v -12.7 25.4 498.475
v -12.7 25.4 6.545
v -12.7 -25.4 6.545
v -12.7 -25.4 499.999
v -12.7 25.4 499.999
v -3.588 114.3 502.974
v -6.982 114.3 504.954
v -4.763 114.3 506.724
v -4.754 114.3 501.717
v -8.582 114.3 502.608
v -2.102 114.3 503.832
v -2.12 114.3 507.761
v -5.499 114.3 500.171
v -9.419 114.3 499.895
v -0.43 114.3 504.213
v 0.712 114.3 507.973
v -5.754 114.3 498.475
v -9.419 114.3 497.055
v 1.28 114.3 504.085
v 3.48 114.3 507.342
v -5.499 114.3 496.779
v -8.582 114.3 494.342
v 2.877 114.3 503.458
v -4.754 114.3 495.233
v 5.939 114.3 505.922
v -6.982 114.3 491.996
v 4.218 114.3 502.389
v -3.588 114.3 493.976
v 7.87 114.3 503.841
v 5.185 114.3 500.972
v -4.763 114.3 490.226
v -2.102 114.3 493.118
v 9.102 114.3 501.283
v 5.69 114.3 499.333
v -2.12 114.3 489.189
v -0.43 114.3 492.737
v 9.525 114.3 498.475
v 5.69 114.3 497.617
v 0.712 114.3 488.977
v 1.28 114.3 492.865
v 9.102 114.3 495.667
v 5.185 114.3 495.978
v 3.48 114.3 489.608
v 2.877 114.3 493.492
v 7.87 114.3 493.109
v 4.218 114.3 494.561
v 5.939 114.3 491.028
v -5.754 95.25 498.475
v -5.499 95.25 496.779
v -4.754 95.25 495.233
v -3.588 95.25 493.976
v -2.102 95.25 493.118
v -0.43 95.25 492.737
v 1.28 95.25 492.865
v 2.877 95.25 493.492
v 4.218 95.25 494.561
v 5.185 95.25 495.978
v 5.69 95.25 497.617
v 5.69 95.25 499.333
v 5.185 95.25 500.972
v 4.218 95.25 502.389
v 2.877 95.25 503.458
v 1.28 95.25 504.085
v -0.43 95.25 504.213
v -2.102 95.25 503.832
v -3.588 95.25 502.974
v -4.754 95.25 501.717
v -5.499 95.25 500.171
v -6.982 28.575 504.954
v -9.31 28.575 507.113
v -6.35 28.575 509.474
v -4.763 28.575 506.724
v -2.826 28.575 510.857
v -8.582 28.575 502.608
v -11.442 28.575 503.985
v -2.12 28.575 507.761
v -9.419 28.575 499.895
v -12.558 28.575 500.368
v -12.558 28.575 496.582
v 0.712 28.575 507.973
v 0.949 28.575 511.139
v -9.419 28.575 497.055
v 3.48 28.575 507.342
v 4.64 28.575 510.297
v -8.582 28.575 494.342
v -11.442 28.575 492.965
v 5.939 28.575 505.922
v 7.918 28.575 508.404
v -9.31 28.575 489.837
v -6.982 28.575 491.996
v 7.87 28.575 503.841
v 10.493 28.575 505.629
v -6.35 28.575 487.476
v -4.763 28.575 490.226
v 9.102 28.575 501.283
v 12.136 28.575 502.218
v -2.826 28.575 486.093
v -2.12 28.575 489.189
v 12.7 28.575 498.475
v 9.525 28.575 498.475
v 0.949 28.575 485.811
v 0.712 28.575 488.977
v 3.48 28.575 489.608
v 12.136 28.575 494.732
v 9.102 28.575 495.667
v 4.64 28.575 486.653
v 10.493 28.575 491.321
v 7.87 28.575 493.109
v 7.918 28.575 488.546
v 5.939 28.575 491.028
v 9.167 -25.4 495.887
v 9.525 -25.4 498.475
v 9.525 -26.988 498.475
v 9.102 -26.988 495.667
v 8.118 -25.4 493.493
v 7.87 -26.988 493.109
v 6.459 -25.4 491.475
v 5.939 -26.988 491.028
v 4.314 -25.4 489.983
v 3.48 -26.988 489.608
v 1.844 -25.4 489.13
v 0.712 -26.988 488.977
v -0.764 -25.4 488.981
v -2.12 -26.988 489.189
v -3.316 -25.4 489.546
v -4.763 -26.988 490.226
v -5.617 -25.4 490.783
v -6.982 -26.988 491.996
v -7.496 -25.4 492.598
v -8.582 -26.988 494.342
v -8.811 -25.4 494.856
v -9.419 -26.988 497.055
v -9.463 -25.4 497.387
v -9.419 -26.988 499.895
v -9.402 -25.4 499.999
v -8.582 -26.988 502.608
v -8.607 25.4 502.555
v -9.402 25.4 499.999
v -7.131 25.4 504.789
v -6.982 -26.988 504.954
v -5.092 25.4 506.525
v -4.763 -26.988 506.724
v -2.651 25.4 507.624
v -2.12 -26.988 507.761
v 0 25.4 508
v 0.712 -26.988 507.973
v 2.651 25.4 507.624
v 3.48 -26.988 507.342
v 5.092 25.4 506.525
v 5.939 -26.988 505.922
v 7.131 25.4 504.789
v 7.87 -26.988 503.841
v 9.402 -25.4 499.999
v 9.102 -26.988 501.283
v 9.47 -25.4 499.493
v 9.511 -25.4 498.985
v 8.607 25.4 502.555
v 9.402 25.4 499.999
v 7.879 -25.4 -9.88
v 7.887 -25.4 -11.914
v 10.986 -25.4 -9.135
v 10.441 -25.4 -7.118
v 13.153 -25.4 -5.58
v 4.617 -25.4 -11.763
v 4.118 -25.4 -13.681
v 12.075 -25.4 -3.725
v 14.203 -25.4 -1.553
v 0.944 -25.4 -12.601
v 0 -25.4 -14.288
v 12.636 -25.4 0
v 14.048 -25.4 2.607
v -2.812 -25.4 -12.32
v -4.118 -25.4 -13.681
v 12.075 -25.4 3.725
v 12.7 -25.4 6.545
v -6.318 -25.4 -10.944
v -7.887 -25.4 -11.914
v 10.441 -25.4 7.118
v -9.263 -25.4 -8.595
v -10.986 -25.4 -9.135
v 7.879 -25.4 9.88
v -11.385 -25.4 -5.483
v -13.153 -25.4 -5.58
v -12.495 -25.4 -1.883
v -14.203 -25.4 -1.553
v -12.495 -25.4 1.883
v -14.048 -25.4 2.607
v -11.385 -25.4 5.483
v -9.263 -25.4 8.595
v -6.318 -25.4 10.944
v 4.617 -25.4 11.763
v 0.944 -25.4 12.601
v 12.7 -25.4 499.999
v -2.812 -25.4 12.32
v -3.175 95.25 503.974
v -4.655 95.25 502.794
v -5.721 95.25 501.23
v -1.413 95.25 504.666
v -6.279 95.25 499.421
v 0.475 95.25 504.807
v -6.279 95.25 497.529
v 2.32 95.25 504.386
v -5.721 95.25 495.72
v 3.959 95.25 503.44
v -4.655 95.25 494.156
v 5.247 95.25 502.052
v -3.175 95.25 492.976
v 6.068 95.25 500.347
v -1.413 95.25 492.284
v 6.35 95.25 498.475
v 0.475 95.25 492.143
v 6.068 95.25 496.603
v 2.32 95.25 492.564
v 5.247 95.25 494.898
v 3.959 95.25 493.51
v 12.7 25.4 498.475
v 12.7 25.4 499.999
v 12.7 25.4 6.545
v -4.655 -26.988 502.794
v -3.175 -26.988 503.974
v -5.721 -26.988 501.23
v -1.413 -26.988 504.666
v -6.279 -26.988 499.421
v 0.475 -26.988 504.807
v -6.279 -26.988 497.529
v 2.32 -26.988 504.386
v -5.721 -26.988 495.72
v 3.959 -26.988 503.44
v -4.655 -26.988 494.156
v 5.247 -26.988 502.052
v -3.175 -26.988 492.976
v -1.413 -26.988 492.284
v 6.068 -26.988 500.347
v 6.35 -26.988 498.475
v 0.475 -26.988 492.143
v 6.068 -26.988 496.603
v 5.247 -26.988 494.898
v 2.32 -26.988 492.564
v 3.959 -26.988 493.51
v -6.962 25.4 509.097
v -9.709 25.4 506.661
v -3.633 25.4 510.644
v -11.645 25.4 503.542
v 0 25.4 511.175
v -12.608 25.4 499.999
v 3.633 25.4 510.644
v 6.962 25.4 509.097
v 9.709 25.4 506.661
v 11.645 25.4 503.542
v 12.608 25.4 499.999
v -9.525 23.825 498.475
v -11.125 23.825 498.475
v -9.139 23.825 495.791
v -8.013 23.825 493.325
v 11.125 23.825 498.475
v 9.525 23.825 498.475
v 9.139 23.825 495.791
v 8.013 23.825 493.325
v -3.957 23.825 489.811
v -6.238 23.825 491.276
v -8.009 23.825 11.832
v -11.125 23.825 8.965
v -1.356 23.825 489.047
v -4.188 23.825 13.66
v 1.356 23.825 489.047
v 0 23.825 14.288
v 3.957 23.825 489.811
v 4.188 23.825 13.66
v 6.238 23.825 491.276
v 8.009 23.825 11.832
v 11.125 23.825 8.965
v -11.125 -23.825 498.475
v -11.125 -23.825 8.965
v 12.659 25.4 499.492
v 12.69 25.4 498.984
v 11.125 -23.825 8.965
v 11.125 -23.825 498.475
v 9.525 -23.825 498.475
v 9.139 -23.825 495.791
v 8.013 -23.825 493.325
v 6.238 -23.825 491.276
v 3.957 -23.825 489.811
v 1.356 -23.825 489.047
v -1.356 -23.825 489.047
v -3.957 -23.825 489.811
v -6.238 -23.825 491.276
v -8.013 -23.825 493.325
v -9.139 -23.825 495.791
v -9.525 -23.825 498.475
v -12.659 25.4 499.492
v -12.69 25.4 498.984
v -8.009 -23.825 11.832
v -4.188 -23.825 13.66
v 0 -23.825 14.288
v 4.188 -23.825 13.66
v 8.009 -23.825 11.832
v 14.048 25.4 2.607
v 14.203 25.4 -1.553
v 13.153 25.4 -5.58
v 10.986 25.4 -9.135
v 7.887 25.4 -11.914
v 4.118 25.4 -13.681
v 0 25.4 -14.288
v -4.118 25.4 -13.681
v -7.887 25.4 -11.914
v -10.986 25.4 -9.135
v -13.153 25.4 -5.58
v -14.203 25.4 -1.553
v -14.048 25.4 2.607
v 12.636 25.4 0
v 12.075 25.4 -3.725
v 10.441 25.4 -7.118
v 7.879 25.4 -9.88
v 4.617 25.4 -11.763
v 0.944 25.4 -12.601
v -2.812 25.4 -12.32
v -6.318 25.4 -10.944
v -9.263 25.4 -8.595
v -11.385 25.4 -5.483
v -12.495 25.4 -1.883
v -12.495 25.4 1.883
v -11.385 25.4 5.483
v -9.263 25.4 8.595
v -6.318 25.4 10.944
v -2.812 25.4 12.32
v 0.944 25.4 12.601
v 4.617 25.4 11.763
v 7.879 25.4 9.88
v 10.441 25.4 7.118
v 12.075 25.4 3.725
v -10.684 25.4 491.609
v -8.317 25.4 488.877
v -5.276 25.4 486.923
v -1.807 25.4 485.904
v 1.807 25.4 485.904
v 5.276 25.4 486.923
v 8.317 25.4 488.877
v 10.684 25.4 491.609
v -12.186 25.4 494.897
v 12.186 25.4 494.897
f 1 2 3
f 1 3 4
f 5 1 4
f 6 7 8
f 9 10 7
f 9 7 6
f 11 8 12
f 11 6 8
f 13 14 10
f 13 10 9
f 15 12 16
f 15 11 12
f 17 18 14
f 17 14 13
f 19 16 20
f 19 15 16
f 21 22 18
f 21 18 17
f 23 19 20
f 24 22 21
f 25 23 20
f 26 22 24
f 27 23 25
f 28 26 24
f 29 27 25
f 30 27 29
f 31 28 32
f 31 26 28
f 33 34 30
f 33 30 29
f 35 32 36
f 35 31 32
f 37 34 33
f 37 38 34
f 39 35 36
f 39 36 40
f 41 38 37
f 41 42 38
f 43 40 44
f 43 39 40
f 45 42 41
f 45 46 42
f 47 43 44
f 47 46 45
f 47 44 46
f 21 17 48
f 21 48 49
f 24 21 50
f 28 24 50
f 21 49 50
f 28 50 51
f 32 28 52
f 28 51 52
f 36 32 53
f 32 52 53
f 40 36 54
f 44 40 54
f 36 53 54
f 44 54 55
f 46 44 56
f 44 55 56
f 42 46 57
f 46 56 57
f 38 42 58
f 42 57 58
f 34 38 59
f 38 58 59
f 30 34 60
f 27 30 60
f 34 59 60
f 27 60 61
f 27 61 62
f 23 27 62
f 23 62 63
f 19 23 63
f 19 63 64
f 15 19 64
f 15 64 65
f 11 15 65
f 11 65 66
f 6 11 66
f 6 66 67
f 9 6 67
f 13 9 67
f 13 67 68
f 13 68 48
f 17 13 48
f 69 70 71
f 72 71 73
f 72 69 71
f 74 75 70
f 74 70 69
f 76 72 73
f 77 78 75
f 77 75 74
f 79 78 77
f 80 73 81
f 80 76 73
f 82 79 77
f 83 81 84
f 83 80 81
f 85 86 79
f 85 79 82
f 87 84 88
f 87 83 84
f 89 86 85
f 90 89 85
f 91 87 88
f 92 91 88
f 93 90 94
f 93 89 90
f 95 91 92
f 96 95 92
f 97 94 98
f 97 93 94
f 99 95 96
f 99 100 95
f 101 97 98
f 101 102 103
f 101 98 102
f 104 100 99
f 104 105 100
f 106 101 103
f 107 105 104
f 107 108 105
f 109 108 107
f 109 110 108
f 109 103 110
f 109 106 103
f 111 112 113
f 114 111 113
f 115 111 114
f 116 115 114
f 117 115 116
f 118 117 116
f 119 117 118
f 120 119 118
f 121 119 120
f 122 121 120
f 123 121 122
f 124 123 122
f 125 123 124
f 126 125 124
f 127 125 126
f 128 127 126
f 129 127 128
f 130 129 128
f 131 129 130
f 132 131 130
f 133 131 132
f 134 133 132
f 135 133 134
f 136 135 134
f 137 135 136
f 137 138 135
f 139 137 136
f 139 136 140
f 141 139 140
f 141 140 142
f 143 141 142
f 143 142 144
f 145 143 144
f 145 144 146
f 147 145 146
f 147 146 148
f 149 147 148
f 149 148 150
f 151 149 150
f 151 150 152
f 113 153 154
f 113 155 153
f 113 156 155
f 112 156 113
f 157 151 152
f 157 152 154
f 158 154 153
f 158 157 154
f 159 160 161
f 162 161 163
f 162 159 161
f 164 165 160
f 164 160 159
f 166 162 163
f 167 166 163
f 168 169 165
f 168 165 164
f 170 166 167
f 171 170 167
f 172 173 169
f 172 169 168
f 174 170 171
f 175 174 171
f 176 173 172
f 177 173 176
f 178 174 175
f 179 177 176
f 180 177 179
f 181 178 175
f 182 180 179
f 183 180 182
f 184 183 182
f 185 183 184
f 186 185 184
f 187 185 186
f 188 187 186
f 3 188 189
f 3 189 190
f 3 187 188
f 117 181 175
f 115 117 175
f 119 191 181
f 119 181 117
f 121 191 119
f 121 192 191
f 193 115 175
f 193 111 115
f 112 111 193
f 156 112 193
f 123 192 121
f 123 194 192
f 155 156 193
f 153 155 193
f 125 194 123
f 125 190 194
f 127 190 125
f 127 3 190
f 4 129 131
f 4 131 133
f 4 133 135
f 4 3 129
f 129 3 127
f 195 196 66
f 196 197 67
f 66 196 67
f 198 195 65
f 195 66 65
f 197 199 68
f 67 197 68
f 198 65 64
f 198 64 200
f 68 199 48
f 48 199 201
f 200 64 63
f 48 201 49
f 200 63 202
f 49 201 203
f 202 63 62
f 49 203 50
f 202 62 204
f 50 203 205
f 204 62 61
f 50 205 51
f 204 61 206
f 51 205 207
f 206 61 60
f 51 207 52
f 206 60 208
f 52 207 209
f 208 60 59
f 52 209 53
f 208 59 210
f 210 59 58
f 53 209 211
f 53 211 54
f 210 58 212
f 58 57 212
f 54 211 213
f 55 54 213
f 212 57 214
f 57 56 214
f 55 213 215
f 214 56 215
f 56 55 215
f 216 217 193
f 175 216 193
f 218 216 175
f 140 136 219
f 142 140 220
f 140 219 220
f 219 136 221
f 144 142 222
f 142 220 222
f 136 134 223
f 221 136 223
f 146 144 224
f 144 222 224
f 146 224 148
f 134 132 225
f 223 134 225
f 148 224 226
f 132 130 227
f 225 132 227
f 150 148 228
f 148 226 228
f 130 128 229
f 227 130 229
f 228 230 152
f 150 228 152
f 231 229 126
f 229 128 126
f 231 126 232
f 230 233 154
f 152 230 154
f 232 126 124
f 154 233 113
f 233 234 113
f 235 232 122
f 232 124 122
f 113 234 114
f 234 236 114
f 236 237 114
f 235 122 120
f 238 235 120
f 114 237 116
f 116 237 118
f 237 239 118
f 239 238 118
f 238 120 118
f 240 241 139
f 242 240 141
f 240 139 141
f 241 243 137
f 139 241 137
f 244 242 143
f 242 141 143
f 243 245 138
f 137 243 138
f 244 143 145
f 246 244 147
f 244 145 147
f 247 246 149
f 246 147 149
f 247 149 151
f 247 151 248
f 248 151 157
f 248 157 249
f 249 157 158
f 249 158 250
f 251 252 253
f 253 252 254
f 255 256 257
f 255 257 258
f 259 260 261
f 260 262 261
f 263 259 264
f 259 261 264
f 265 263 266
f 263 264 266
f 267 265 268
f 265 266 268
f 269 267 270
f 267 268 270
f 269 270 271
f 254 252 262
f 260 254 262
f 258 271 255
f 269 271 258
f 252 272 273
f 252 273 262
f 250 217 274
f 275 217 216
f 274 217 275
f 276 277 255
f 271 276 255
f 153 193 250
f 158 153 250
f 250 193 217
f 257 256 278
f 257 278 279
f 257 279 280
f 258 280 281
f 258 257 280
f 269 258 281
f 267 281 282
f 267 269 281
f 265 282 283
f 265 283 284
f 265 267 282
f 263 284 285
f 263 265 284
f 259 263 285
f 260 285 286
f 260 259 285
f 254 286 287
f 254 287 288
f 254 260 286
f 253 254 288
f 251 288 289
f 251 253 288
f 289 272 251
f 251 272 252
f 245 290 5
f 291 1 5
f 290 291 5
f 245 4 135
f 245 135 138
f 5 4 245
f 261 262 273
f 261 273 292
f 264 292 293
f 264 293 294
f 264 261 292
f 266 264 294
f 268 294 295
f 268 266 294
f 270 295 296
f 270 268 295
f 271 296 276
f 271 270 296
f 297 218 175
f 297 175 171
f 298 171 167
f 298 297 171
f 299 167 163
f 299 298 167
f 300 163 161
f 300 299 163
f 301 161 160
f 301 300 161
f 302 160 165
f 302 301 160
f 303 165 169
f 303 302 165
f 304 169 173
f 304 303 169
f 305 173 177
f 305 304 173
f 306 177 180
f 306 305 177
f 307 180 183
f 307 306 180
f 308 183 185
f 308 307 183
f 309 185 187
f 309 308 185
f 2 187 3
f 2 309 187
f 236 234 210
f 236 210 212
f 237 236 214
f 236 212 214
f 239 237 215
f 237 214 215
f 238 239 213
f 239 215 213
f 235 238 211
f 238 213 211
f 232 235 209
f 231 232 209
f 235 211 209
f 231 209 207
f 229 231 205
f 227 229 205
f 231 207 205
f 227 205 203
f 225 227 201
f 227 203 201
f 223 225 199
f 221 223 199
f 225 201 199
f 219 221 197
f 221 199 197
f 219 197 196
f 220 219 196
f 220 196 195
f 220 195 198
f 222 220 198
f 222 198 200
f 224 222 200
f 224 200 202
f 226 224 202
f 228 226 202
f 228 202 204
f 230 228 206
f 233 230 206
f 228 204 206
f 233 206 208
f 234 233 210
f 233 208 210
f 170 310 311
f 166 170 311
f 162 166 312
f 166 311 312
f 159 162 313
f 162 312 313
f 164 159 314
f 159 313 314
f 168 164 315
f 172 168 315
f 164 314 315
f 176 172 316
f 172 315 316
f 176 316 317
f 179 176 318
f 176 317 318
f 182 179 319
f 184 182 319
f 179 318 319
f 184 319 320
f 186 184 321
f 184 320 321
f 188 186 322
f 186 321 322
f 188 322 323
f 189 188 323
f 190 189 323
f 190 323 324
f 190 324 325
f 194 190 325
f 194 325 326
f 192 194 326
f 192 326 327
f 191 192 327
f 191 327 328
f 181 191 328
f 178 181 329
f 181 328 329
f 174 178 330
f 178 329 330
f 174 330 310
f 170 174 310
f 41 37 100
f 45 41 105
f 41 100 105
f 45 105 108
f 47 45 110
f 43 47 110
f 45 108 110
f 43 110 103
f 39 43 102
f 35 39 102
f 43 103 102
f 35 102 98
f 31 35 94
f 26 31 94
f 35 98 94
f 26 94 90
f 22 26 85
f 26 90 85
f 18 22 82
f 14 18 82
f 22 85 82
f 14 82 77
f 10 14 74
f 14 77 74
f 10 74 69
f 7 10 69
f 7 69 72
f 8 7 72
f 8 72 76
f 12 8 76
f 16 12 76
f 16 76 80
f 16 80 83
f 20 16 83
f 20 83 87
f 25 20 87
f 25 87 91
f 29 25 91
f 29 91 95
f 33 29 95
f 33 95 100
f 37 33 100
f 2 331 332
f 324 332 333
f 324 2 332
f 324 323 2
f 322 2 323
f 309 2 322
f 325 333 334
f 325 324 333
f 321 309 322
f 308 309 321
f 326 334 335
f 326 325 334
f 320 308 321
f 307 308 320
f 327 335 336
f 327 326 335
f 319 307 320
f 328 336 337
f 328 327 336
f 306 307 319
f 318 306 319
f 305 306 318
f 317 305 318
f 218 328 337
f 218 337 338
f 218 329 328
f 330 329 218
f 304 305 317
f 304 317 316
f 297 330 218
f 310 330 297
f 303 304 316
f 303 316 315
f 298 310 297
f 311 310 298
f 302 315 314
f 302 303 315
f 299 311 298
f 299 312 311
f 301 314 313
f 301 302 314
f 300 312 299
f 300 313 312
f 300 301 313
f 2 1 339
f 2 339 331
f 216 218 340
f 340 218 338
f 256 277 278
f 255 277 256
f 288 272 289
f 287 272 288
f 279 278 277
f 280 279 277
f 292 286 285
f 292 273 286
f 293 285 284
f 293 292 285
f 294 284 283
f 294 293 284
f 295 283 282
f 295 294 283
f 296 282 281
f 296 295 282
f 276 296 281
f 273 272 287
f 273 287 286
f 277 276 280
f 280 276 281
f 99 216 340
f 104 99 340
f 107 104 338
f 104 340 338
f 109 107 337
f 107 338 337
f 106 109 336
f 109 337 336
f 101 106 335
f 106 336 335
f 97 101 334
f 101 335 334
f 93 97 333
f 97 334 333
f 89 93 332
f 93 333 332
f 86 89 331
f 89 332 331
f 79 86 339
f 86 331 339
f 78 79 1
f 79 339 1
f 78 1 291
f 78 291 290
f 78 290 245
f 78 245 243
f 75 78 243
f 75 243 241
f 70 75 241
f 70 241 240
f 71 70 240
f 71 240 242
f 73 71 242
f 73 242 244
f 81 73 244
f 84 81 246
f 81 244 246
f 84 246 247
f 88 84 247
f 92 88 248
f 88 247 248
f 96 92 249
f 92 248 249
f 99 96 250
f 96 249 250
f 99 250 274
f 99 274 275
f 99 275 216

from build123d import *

# Parameters (mm, degrees)
SKETCH1_W                       = 25.4
SKETCH1_H                       = 50.8
SKETCH1_W_2                     = 22.2504
SKETCH1_H_2                     = 47.6504
BOSS_EXTRUDE1_DEPTH             = 498.475
SKETCH2_R                       = 14.2875
SKETCH2_R_2                     = 9.525
CUT_EXTRUDE1_DEPTH              = 51.8
SKETCH3_R                       = 14.2875
SKETCH3_R_2                     = 12.6365
BOSS_EXTRUDE2_DEPTH             = 50.8
SKETCH4_R                       = 9.525
SKETCH4_R_2                     = 6.35
BOSS_EXTRUDE3_DEPTH             = 88.9
BOSS_EXTRUDE3_DEPTH_BACK        = 52.3875
SKETCH5_R                       = 12.7
SKETCH5_R_2                     = 9.525
BOSS_EXTRUDE4_DEPTH             = 3.175
SKETCH6_R                       = 6.35
BOSS_EXTRUDE5_DEPTH             = 19.05
TAP_DRILL_FOR_1_2_20_TAP1_D     = 11.50874
TAP_DRILL_FOR_1_2_20_TAP1_DEPTH = 19.05
BOSS_EXTRUDE6_REACH             = 28.987
SKETCH9_W                       = 1.524
SKETCH9_H                       = 50.8
BOSS_EXTRUDE7_REACH             = 28.988
SKETCH10_W                      = 1.524
SKETCH10_H                      = 50.8


with BuildPart() as part:
    # Sketch1 → Boss-Extrude1 (new body)
    with BuildSketch(Plane.XY):
        Rectangle(SKETCH1_W, SKETCH1_H)
        Rectangle(SKETCH1_W_2, SKETCH1_H_2, mode=Mode.SUBTRACT)
    extrude(amount=BOSS_EXTRUDE1_DEPTH)

    # Sketch2 → Cut-Extrude1 (cut, through all)
    with BuildSketch(Plane(origin=(0, 25.4, 0), x_dir=(1, 0, 0), z_dir=(0, 1, 0))):
        Circle(SKETCH2_R)
        with Locations((0, -498.475)):
            Circle(SKETCH2_R_2)
    extrude(amount=-CUT_EXTRUDE1_DEPTH, mode=Mode.SUBTRACT)

    # Sketch3 → Boss-Extrude2 (add)
    with BuildSketch(Plane(origin=(0, 25.4, 0), x_dir=(1, 0, 0), z_dir=(0, 1, 0))):
        Circle(SKETCH3_R)
        Circle(SKETCH3_R_2, mode=Mode.SUBTRACT)
    extrude(amount=-BOSS_EXTRUDE2_DEPTH)

    # Sketch4 → Boss-Extrude3 (add, two sides)
    with BuildSketch(Plane(origin=(0, 25.4, 0), x_dir=(1, 0, 0), z_dir=(0, 1, 0))) as boss_extrude3_sk:
        with Locations((0, -498.475)):
            Circle(SKETCH4_R)
        with Locations((0, -498.475)):
            Circle(SKETCH4_R_2, mode=Mode.SUBTRACT)
    extrude(amount=BOSS_EXTRUDE3_DEPTH)
    extrude(boss_extrude3_sk.sketch, amount=-BOSS_EXTRUDE3_DEPTH_BACK)

    # Sketch5 → Boss-Extrude4 (add)
    with BuildSketch(Plane(origin=(0, 25.4, 0), x_dir=(1, 0, 0), z_dir=(0, 1, 0))):
        with Locations((0, -498.475)):
            Circle(SKETCH5_R)
        with Locations((0, -498.475)):
            Circle(SKETCH5_R_2, mode=Mode.SUBTRACT)
    extrude(amount=BOSS_EXTRUDE4_DEPTH)

    # Sketch6 → Boss-Extrude5 (add)
    with BuildSketch(Plane(origin=(0, 114.3, 0), x_dir=(1, 0, 0), z_dir=(0, 1, 0))):
        with Locations((0, -498.475)):
            Circle(SKETCH6_R)
    extrude(amount=-BOSS_EXTRUDE5_DEPTH)

    # Tap Drill for 1/2-20 Tap1
    with Locations(Plane(origin=(0, 114.3, 0), x_dir=(1, 0, 0), z_dir=(0, 1, 0))):
        with Locations((0, -498.475)):
            Hole(TAP_DRILL_FOR_1_2_20_TAP1_D / 2, depth=TAP_DRILL_FOR_1_2_20_TAP1_DEPTH)

    # Sketch9 → Boss-Extrude6 (add, up to next)
    with BuildSketch(Plane(origin=(12.7, 0, 0), x_dir=(0, 0, -1), z_dir=(1, 0, 0)), mode=Mode.PRIVATE) as boss_extrude6_sk1:
        with Locations((-499.237, 0)):
            Rectangle(SKETCH9_W, SKETCH9_H)
    boss_extrude6_tool1 = extrude(boss_extrude6_sk1.sketch, amount=-BOSS_EXTRUDE6_REACH, mode=Mode.PRIVATE) - part.part
    add(boss_extrude6_tool1.solids().sort_by_distance((12.7, 0, 499.237))[0])

    # Sketch10 → Boss-Extrude7 (add, up to next)
    with BuildSketch(Plane.ZY.offset(12.7), mode=Mode.PRIVATE) as boss_extrude7_sk1:
        with Locations((499.237, 0)):
            Rectangle(SKETCH10_W, SKETCH10_H)
    boss_extrude7_tool1 = extrude(boss_extrude7_sk1.sketch, amount=-BOSS_EXTRUDE7_REACH, mode=Mode.PRIVATE) - part.part
    add(boss_extrude7_tool1.solids().sort_by_distance((-12.7, 0, 499.237))[0])


solid = part.part
